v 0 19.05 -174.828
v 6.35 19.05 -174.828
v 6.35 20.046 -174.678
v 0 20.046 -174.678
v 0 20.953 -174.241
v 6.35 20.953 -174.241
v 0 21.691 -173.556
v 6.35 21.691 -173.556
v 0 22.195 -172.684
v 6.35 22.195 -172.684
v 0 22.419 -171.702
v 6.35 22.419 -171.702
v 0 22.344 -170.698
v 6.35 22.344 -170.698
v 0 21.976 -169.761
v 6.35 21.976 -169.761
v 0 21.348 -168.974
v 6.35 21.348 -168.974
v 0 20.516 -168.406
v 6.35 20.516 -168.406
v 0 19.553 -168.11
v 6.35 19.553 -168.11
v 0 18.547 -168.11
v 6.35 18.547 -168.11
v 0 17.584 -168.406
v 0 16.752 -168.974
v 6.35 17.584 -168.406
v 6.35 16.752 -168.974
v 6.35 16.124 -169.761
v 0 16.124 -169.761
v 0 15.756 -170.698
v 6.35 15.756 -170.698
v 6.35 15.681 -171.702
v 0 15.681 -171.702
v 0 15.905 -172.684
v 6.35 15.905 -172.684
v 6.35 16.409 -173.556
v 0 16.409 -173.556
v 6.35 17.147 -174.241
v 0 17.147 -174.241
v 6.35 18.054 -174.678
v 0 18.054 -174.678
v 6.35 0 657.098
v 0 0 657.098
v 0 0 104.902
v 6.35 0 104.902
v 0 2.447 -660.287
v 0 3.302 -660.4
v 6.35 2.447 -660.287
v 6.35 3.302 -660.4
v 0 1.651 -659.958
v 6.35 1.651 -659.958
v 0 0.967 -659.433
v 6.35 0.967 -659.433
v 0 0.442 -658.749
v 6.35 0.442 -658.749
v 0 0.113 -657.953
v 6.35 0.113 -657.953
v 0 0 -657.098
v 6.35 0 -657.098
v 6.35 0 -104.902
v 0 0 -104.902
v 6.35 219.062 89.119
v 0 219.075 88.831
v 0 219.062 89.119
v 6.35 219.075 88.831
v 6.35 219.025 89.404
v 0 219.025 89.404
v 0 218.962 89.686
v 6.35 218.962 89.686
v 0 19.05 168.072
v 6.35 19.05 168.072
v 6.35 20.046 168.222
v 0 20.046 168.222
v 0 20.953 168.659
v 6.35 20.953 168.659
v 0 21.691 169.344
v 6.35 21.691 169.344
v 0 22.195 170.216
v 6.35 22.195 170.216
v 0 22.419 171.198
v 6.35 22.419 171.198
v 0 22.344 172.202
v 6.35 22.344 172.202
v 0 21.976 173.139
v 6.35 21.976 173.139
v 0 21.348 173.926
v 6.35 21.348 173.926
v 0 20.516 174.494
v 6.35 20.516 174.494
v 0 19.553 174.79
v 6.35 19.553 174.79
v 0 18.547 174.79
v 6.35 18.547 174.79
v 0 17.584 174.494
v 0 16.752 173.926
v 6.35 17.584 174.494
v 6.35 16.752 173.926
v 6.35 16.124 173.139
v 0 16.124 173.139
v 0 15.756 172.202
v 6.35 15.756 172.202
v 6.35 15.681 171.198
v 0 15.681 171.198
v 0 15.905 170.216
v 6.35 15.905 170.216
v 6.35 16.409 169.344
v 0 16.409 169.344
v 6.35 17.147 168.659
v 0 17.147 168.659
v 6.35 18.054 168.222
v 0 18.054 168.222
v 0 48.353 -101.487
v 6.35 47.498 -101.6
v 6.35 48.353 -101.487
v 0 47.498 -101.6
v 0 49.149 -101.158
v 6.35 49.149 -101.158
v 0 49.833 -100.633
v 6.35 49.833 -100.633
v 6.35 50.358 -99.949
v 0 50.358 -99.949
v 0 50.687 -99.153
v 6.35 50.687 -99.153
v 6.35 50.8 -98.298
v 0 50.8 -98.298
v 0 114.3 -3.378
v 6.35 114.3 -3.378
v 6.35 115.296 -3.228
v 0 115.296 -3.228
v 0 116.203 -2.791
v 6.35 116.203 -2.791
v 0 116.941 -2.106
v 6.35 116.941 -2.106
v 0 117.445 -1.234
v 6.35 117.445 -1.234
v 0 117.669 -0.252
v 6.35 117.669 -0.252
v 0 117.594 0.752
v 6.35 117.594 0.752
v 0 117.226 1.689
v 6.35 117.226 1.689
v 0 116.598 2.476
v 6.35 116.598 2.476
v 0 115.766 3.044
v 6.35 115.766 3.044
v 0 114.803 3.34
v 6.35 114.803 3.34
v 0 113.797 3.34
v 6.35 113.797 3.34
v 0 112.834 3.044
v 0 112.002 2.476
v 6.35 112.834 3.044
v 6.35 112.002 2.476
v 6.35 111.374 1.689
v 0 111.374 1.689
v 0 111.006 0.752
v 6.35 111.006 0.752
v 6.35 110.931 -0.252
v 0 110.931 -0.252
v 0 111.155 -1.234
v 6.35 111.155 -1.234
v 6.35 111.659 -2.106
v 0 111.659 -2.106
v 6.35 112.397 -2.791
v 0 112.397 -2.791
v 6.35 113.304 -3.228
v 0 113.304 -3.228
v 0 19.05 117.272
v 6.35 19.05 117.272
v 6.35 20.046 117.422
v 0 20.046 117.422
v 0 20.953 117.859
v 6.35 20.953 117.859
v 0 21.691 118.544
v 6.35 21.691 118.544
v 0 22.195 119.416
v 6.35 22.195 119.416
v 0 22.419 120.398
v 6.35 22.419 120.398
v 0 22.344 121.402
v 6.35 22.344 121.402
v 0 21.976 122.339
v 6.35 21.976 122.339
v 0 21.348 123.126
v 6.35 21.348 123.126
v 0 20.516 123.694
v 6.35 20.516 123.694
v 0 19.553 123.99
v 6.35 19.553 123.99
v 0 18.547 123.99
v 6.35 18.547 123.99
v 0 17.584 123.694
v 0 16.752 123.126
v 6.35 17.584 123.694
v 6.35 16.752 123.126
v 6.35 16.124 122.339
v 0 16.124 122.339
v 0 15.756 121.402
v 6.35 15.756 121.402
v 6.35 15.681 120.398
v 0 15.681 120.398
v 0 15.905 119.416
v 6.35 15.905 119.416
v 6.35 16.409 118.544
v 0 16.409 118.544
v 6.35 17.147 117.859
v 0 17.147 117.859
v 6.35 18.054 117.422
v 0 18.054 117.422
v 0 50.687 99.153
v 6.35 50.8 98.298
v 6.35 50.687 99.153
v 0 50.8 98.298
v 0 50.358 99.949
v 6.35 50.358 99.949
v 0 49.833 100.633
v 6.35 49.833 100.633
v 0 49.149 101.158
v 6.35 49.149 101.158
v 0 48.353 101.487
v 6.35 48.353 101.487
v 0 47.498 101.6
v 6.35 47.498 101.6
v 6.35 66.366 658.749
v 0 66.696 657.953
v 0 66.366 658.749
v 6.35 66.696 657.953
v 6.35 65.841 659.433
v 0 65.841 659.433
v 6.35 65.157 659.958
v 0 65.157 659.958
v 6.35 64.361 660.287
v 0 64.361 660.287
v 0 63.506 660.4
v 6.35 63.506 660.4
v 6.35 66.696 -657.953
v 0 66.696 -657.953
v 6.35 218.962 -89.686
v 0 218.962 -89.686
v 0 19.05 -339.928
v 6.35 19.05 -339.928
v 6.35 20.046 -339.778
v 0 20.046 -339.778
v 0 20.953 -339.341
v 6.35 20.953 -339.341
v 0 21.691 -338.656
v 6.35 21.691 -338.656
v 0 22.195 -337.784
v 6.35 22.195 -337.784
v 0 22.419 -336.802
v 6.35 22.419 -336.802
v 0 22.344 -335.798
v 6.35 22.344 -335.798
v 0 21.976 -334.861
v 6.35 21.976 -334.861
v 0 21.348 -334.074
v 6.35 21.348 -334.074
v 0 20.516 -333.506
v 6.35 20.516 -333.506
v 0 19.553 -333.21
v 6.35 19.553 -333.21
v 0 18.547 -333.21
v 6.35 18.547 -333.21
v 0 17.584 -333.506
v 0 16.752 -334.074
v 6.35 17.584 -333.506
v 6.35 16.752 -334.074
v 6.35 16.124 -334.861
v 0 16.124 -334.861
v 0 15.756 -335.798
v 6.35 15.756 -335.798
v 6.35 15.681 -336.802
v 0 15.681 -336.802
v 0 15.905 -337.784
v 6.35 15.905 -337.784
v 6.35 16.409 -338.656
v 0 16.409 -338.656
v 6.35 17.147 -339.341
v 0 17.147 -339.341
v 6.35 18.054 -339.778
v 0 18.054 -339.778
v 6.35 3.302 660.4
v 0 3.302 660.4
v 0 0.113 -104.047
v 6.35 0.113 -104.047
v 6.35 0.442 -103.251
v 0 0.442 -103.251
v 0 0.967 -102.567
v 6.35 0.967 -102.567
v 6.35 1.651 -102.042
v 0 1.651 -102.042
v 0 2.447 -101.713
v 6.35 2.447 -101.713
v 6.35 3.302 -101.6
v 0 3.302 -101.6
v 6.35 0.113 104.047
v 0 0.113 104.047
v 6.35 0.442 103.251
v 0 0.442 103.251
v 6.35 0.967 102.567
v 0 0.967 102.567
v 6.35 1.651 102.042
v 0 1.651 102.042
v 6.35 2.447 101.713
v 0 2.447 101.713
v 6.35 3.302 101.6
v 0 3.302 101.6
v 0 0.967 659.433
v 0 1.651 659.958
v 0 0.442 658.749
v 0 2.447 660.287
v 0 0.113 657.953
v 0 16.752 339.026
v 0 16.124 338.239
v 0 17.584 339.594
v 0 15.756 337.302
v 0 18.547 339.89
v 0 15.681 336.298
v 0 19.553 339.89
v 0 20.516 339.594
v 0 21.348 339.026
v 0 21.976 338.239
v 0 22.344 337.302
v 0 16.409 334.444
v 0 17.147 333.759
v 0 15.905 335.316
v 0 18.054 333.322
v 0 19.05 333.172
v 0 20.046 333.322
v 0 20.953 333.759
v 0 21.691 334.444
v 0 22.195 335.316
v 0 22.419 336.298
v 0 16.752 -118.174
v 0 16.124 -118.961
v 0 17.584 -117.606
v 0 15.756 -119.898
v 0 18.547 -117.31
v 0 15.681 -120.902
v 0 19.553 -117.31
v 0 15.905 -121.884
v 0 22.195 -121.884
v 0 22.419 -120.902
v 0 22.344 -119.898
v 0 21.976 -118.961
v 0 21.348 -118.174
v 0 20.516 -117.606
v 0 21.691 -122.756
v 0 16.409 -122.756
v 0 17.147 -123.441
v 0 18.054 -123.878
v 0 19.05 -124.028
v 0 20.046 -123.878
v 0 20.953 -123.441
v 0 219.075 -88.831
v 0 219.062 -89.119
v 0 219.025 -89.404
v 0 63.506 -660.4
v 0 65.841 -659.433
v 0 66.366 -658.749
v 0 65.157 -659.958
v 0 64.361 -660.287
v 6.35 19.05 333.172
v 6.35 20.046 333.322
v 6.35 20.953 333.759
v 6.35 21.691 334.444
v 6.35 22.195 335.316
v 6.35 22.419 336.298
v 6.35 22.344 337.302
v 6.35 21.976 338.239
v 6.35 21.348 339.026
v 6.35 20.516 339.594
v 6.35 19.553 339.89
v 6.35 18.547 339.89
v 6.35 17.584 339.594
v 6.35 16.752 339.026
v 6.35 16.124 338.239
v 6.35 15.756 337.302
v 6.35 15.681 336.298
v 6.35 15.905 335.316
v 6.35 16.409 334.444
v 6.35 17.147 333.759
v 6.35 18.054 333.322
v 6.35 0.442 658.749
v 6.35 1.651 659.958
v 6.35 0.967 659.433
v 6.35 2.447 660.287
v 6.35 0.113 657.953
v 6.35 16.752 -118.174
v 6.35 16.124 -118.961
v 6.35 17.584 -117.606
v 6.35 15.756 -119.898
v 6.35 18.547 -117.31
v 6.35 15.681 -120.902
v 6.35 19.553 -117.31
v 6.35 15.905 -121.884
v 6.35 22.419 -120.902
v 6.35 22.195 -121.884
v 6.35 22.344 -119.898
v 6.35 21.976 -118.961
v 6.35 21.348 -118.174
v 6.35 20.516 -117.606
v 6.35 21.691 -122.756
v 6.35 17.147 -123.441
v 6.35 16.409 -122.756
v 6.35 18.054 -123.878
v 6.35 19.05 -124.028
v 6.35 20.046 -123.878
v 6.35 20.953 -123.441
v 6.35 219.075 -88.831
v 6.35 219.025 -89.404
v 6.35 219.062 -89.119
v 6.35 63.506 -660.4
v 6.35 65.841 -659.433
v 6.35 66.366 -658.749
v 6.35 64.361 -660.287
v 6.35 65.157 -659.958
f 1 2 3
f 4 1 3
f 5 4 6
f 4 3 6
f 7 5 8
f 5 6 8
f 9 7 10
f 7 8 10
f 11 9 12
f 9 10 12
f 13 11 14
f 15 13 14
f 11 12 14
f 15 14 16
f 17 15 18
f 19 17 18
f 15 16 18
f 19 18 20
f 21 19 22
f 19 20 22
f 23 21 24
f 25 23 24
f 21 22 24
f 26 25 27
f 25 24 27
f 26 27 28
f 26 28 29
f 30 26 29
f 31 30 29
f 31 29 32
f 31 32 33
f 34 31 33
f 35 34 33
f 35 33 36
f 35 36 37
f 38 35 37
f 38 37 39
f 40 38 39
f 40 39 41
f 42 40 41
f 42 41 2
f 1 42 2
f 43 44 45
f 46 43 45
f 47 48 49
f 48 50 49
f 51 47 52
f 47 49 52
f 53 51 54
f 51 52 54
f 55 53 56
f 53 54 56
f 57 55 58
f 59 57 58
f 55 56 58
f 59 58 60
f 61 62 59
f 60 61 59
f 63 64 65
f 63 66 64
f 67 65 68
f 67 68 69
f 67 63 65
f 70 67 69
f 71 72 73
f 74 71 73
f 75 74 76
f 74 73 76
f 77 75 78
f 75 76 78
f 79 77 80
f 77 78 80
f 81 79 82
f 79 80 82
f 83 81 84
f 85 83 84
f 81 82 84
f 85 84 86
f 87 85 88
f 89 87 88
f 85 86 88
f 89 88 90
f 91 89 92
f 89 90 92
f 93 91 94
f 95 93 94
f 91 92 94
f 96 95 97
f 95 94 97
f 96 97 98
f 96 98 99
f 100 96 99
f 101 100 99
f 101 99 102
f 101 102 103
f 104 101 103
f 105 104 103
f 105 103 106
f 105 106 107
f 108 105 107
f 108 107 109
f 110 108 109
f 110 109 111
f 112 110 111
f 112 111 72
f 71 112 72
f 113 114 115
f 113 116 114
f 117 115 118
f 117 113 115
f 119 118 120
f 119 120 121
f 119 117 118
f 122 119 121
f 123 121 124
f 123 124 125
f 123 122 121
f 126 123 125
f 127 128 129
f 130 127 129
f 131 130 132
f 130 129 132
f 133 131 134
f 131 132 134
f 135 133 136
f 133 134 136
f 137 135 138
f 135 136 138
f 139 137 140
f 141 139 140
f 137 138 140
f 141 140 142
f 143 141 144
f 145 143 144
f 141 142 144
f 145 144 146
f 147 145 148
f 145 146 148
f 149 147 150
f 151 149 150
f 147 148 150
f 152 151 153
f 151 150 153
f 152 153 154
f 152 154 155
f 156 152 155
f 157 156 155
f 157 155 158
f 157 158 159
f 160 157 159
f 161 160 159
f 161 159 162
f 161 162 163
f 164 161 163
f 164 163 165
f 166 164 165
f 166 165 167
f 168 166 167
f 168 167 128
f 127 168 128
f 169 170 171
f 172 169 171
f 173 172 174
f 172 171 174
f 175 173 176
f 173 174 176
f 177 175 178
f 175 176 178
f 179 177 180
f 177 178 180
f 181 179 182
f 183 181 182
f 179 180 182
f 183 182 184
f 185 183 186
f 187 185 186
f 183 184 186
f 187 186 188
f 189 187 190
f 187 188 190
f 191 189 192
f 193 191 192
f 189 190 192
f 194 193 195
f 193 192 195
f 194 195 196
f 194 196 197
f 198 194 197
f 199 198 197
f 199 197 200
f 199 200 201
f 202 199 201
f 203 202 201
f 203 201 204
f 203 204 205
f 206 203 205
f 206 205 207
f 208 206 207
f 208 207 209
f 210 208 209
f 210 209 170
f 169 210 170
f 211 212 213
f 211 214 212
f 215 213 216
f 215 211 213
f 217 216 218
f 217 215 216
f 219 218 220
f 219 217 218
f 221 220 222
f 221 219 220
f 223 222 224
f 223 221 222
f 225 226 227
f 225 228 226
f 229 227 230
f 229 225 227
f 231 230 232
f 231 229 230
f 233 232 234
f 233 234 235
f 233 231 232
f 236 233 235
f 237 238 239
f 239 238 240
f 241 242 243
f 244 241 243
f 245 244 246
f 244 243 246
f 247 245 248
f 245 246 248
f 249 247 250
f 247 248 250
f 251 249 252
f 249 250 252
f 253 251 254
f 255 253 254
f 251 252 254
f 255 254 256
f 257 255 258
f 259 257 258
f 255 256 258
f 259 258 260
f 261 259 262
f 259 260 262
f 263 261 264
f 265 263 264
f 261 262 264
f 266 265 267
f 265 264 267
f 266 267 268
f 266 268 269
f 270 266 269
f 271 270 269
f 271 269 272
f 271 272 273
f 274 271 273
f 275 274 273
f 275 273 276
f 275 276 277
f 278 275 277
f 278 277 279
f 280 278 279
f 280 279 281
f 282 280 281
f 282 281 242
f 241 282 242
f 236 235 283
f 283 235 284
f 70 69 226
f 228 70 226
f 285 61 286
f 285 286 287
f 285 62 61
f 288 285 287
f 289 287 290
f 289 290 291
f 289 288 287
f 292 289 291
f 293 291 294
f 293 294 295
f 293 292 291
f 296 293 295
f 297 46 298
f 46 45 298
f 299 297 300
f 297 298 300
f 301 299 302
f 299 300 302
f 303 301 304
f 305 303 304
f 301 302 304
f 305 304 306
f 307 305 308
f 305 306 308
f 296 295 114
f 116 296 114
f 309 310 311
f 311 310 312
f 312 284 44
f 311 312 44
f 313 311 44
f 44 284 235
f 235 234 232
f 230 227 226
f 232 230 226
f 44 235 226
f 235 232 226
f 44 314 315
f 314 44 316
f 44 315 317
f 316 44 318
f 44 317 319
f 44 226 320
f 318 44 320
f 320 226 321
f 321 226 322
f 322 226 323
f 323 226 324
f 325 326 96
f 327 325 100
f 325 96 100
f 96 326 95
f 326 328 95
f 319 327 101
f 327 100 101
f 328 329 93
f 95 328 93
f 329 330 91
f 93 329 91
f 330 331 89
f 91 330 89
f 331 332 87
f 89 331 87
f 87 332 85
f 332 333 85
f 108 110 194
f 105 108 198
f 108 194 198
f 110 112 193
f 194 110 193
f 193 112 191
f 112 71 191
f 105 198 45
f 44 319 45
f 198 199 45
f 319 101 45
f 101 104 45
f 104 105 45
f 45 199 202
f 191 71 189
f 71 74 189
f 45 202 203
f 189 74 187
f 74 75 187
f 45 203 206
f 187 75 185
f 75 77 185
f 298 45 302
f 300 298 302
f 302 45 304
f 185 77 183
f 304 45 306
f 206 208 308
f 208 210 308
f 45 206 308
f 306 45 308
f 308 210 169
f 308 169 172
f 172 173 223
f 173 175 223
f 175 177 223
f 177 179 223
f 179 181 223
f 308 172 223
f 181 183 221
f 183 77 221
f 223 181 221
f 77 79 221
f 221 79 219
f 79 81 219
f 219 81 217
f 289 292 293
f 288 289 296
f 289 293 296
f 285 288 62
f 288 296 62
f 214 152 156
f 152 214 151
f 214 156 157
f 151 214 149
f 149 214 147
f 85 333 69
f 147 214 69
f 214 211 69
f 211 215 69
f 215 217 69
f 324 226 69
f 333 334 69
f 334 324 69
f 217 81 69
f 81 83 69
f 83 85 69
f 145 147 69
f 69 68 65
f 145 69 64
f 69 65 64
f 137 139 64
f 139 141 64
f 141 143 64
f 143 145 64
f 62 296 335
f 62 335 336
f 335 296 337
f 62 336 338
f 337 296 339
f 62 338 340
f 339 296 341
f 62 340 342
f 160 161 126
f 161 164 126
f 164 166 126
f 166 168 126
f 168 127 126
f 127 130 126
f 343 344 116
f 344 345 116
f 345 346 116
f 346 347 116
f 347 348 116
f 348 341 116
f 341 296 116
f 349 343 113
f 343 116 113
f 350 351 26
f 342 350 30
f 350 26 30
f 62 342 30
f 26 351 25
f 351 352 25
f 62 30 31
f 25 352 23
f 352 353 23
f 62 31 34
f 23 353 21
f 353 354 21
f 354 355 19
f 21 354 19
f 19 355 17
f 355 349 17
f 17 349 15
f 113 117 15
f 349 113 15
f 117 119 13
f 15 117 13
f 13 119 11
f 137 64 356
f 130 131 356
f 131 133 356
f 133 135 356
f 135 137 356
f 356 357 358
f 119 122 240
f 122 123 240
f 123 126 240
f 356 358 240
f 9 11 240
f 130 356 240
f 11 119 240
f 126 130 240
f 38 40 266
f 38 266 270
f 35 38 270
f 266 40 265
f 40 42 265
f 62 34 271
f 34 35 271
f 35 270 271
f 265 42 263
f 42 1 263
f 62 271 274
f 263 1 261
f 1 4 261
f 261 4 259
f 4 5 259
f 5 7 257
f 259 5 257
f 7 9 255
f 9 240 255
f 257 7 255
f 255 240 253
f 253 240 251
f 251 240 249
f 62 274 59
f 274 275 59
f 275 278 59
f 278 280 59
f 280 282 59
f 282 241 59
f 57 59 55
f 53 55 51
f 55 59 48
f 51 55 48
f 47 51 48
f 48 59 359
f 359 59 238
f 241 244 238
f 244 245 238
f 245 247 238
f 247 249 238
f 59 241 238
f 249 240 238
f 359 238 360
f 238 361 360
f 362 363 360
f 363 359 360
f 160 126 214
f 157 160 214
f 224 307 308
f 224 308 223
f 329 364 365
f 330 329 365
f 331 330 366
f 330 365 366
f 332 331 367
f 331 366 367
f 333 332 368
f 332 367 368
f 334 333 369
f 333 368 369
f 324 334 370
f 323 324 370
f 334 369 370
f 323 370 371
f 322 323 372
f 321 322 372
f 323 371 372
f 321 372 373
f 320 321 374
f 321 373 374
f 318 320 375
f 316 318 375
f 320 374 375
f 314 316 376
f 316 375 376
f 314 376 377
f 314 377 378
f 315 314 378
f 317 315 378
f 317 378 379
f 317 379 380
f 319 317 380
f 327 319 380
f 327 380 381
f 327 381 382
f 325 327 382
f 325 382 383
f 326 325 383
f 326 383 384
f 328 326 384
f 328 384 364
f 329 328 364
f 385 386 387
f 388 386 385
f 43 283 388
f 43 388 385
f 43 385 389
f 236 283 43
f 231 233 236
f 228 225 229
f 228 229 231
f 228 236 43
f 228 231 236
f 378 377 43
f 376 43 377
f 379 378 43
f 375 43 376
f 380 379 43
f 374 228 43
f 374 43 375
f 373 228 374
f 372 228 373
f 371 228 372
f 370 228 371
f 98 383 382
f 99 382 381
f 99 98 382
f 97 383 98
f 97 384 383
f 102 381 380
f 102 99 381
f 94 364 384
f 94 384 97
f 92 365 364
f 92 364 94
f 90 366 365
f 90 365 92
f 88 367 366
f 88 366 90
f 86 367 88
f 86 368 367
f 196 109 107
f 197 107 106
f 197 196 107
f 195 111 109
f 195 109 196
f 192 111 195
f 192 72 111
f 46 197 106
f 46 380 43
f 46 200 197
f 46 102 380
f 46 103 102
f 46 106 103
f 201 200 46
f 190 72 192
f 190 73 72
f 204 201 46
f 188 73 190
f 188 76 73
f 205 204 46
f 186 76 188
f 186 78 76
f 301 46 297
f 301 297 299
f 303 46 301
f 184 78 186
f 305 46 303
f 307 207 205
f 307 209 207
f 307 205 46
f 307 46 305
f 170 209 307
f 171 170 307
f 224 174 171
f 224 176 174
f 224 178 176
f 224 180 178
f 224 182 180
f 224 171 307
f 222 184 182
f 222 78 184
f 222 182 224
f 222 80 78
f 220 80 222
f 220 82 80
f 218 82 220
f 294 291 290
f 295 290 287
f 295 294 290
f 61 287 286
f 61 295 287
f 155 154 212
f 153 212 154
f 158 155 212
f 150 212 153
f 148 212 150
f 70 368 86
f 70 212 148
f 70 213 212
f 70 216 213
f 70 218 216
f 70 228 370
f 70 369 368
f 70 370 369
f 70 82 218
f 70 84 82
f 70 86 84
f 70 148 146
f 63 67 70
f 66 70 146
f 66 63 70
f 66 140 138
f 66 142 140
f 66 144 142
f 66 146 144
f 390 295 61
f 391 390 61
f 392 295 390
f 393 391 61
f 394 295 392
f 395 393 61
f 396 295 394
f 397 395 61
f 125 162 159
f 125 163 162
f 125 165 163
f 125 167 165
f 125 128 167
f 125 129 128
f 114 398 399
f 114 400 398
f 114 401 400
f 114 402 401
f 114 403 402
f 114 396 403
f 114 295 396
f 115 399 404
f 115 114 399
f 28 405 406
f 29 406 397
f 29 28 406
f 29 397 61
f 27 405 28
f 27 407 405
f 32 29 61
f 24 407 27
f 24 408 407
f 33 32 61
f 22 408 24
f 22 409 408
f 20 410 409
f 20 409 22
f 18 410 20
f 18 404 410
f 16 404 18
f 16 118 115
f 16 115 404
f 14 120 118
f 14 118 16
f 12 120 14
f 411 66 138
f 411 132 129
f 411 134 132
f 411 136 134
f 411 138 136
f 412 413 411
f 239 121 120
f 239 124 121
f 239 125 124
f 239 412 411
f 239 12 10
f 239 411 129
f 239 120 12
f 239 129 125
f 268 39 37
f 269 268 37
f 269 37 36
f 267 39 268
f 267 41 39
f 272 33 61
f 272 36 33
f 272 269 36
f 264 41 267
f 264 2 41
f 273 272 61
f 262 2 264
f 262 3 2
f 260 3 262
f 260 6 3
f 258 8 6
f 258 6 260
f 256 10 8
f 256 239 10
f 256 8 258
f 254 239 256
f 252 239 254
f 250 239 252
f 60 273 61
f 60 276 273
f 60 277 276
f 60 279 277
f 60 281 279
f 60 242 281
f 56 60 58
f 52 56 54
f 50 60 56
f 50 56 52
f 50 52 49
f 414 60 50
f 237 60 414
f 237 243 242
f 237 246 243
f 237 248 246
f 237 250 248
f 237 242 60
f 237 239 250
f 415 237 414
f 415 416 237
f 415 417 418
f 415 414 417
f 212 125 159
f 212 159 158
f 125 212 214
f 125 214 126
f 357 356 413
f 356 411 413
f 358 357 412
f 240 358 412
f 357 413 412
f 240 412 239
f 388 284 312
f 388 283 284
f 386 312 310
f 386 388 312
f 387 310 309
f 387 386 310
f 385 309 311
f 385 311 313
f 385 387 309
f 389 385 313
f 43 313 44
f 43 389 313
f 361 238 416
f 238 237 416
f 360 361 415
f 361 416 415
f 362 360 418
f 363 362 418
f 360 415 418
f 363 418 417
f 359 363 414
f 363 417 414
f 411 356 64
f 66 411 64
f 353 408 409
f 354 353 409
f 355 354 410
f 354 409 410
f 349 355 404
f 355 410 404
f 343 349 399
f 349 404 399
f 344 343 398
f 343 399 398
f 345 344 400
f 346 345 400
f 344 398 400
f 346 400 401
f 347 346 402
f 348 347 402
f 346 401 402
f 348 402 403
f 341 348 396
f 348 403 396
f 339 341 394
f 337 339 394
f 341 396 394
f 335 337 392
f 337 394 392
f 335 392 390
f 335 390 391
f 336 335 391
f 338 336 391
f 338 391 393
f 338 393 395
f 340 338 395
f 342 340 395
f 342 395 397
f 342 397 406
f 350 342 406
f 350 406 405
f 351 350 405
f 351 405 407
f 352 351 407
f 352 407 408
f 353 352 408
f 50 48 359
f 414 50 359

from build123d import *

# Parameters (mm, degrees)
BOSS_EXTRUDE1_DEPTH     = 6.35
SKETCH2_W               = 203.2
SKETCH2_H               = 50.8
CUT_EXTRUDE1_DEPTH      = 696.81774778
F_1_4_CLEARANCE_HOLE1_D = 6.7564
FILLET1_R               = 3.302


with BuildPart() as part:
    # Sketch1 → Boss-Extrude1 (new body)
    with BuildSketch(Plane(origin=(0, 0, 0), x_dir=(0, 0, -1), z_dir=(1, 0, 0))):
        Polygon((89.265604664, 219.075), (-89.265604664, 219.075), (-660.4, 66.04), (-660.4, 0), (660.4, 0), (660.4, 66.04), align=None)
    extrude(amount=BOSS_EXTRUDE1_DEPTH)

    # Sketch2 → Cut-Extrude1 (cut, through all)
    with BuildSketch(Plane(origin=(6.35, 0, 0), x_dir=(0, 0, -1), z_dir=(1, 0, 0))):
        with Locations((0, 25.4)):
            Rectangle(SKETCH2_W, SKETCH2_H)
    extrude(amount=-CUT_EXTRUDE1_DEPTH, mode=Mode.SUBTRACT)

    # 1/4 Clearance Hole1 (through all)
    with Locations(Plane.ZY):
        with Locations((-336.55, 19.05), (-120.65, 19.05), (120.65, 19.05), (336.55, 19.05), (0, 114.3), (-171.45, 19.05), (171.45, 19.05)):
            Hole(F_1_4_CLEARANCE_HOLE1_D / 2)

    # Fillet1
    fillet1_edges = [part.edges().sort_by_distance(p)[0] for p in [
        (3.175, 66.04, 660.4),
        (3.175, 219.075, 89.265604664),
        (3.175, 219.075, -89.265604664),
        (3.175, 66.04, -660.4),
        (3.175, 0, -660.4),
        (3.175, 0, 660.4),
        (3.175, 0, -101.6),
        (3.175, 0, 101.6),
        (3.175, 50.8, 101.6),
        (3.175, 50.8, -101.6),
    ]]
    fillet(fillet1_edges, radius=FILLET1_R)


solid = part.part
